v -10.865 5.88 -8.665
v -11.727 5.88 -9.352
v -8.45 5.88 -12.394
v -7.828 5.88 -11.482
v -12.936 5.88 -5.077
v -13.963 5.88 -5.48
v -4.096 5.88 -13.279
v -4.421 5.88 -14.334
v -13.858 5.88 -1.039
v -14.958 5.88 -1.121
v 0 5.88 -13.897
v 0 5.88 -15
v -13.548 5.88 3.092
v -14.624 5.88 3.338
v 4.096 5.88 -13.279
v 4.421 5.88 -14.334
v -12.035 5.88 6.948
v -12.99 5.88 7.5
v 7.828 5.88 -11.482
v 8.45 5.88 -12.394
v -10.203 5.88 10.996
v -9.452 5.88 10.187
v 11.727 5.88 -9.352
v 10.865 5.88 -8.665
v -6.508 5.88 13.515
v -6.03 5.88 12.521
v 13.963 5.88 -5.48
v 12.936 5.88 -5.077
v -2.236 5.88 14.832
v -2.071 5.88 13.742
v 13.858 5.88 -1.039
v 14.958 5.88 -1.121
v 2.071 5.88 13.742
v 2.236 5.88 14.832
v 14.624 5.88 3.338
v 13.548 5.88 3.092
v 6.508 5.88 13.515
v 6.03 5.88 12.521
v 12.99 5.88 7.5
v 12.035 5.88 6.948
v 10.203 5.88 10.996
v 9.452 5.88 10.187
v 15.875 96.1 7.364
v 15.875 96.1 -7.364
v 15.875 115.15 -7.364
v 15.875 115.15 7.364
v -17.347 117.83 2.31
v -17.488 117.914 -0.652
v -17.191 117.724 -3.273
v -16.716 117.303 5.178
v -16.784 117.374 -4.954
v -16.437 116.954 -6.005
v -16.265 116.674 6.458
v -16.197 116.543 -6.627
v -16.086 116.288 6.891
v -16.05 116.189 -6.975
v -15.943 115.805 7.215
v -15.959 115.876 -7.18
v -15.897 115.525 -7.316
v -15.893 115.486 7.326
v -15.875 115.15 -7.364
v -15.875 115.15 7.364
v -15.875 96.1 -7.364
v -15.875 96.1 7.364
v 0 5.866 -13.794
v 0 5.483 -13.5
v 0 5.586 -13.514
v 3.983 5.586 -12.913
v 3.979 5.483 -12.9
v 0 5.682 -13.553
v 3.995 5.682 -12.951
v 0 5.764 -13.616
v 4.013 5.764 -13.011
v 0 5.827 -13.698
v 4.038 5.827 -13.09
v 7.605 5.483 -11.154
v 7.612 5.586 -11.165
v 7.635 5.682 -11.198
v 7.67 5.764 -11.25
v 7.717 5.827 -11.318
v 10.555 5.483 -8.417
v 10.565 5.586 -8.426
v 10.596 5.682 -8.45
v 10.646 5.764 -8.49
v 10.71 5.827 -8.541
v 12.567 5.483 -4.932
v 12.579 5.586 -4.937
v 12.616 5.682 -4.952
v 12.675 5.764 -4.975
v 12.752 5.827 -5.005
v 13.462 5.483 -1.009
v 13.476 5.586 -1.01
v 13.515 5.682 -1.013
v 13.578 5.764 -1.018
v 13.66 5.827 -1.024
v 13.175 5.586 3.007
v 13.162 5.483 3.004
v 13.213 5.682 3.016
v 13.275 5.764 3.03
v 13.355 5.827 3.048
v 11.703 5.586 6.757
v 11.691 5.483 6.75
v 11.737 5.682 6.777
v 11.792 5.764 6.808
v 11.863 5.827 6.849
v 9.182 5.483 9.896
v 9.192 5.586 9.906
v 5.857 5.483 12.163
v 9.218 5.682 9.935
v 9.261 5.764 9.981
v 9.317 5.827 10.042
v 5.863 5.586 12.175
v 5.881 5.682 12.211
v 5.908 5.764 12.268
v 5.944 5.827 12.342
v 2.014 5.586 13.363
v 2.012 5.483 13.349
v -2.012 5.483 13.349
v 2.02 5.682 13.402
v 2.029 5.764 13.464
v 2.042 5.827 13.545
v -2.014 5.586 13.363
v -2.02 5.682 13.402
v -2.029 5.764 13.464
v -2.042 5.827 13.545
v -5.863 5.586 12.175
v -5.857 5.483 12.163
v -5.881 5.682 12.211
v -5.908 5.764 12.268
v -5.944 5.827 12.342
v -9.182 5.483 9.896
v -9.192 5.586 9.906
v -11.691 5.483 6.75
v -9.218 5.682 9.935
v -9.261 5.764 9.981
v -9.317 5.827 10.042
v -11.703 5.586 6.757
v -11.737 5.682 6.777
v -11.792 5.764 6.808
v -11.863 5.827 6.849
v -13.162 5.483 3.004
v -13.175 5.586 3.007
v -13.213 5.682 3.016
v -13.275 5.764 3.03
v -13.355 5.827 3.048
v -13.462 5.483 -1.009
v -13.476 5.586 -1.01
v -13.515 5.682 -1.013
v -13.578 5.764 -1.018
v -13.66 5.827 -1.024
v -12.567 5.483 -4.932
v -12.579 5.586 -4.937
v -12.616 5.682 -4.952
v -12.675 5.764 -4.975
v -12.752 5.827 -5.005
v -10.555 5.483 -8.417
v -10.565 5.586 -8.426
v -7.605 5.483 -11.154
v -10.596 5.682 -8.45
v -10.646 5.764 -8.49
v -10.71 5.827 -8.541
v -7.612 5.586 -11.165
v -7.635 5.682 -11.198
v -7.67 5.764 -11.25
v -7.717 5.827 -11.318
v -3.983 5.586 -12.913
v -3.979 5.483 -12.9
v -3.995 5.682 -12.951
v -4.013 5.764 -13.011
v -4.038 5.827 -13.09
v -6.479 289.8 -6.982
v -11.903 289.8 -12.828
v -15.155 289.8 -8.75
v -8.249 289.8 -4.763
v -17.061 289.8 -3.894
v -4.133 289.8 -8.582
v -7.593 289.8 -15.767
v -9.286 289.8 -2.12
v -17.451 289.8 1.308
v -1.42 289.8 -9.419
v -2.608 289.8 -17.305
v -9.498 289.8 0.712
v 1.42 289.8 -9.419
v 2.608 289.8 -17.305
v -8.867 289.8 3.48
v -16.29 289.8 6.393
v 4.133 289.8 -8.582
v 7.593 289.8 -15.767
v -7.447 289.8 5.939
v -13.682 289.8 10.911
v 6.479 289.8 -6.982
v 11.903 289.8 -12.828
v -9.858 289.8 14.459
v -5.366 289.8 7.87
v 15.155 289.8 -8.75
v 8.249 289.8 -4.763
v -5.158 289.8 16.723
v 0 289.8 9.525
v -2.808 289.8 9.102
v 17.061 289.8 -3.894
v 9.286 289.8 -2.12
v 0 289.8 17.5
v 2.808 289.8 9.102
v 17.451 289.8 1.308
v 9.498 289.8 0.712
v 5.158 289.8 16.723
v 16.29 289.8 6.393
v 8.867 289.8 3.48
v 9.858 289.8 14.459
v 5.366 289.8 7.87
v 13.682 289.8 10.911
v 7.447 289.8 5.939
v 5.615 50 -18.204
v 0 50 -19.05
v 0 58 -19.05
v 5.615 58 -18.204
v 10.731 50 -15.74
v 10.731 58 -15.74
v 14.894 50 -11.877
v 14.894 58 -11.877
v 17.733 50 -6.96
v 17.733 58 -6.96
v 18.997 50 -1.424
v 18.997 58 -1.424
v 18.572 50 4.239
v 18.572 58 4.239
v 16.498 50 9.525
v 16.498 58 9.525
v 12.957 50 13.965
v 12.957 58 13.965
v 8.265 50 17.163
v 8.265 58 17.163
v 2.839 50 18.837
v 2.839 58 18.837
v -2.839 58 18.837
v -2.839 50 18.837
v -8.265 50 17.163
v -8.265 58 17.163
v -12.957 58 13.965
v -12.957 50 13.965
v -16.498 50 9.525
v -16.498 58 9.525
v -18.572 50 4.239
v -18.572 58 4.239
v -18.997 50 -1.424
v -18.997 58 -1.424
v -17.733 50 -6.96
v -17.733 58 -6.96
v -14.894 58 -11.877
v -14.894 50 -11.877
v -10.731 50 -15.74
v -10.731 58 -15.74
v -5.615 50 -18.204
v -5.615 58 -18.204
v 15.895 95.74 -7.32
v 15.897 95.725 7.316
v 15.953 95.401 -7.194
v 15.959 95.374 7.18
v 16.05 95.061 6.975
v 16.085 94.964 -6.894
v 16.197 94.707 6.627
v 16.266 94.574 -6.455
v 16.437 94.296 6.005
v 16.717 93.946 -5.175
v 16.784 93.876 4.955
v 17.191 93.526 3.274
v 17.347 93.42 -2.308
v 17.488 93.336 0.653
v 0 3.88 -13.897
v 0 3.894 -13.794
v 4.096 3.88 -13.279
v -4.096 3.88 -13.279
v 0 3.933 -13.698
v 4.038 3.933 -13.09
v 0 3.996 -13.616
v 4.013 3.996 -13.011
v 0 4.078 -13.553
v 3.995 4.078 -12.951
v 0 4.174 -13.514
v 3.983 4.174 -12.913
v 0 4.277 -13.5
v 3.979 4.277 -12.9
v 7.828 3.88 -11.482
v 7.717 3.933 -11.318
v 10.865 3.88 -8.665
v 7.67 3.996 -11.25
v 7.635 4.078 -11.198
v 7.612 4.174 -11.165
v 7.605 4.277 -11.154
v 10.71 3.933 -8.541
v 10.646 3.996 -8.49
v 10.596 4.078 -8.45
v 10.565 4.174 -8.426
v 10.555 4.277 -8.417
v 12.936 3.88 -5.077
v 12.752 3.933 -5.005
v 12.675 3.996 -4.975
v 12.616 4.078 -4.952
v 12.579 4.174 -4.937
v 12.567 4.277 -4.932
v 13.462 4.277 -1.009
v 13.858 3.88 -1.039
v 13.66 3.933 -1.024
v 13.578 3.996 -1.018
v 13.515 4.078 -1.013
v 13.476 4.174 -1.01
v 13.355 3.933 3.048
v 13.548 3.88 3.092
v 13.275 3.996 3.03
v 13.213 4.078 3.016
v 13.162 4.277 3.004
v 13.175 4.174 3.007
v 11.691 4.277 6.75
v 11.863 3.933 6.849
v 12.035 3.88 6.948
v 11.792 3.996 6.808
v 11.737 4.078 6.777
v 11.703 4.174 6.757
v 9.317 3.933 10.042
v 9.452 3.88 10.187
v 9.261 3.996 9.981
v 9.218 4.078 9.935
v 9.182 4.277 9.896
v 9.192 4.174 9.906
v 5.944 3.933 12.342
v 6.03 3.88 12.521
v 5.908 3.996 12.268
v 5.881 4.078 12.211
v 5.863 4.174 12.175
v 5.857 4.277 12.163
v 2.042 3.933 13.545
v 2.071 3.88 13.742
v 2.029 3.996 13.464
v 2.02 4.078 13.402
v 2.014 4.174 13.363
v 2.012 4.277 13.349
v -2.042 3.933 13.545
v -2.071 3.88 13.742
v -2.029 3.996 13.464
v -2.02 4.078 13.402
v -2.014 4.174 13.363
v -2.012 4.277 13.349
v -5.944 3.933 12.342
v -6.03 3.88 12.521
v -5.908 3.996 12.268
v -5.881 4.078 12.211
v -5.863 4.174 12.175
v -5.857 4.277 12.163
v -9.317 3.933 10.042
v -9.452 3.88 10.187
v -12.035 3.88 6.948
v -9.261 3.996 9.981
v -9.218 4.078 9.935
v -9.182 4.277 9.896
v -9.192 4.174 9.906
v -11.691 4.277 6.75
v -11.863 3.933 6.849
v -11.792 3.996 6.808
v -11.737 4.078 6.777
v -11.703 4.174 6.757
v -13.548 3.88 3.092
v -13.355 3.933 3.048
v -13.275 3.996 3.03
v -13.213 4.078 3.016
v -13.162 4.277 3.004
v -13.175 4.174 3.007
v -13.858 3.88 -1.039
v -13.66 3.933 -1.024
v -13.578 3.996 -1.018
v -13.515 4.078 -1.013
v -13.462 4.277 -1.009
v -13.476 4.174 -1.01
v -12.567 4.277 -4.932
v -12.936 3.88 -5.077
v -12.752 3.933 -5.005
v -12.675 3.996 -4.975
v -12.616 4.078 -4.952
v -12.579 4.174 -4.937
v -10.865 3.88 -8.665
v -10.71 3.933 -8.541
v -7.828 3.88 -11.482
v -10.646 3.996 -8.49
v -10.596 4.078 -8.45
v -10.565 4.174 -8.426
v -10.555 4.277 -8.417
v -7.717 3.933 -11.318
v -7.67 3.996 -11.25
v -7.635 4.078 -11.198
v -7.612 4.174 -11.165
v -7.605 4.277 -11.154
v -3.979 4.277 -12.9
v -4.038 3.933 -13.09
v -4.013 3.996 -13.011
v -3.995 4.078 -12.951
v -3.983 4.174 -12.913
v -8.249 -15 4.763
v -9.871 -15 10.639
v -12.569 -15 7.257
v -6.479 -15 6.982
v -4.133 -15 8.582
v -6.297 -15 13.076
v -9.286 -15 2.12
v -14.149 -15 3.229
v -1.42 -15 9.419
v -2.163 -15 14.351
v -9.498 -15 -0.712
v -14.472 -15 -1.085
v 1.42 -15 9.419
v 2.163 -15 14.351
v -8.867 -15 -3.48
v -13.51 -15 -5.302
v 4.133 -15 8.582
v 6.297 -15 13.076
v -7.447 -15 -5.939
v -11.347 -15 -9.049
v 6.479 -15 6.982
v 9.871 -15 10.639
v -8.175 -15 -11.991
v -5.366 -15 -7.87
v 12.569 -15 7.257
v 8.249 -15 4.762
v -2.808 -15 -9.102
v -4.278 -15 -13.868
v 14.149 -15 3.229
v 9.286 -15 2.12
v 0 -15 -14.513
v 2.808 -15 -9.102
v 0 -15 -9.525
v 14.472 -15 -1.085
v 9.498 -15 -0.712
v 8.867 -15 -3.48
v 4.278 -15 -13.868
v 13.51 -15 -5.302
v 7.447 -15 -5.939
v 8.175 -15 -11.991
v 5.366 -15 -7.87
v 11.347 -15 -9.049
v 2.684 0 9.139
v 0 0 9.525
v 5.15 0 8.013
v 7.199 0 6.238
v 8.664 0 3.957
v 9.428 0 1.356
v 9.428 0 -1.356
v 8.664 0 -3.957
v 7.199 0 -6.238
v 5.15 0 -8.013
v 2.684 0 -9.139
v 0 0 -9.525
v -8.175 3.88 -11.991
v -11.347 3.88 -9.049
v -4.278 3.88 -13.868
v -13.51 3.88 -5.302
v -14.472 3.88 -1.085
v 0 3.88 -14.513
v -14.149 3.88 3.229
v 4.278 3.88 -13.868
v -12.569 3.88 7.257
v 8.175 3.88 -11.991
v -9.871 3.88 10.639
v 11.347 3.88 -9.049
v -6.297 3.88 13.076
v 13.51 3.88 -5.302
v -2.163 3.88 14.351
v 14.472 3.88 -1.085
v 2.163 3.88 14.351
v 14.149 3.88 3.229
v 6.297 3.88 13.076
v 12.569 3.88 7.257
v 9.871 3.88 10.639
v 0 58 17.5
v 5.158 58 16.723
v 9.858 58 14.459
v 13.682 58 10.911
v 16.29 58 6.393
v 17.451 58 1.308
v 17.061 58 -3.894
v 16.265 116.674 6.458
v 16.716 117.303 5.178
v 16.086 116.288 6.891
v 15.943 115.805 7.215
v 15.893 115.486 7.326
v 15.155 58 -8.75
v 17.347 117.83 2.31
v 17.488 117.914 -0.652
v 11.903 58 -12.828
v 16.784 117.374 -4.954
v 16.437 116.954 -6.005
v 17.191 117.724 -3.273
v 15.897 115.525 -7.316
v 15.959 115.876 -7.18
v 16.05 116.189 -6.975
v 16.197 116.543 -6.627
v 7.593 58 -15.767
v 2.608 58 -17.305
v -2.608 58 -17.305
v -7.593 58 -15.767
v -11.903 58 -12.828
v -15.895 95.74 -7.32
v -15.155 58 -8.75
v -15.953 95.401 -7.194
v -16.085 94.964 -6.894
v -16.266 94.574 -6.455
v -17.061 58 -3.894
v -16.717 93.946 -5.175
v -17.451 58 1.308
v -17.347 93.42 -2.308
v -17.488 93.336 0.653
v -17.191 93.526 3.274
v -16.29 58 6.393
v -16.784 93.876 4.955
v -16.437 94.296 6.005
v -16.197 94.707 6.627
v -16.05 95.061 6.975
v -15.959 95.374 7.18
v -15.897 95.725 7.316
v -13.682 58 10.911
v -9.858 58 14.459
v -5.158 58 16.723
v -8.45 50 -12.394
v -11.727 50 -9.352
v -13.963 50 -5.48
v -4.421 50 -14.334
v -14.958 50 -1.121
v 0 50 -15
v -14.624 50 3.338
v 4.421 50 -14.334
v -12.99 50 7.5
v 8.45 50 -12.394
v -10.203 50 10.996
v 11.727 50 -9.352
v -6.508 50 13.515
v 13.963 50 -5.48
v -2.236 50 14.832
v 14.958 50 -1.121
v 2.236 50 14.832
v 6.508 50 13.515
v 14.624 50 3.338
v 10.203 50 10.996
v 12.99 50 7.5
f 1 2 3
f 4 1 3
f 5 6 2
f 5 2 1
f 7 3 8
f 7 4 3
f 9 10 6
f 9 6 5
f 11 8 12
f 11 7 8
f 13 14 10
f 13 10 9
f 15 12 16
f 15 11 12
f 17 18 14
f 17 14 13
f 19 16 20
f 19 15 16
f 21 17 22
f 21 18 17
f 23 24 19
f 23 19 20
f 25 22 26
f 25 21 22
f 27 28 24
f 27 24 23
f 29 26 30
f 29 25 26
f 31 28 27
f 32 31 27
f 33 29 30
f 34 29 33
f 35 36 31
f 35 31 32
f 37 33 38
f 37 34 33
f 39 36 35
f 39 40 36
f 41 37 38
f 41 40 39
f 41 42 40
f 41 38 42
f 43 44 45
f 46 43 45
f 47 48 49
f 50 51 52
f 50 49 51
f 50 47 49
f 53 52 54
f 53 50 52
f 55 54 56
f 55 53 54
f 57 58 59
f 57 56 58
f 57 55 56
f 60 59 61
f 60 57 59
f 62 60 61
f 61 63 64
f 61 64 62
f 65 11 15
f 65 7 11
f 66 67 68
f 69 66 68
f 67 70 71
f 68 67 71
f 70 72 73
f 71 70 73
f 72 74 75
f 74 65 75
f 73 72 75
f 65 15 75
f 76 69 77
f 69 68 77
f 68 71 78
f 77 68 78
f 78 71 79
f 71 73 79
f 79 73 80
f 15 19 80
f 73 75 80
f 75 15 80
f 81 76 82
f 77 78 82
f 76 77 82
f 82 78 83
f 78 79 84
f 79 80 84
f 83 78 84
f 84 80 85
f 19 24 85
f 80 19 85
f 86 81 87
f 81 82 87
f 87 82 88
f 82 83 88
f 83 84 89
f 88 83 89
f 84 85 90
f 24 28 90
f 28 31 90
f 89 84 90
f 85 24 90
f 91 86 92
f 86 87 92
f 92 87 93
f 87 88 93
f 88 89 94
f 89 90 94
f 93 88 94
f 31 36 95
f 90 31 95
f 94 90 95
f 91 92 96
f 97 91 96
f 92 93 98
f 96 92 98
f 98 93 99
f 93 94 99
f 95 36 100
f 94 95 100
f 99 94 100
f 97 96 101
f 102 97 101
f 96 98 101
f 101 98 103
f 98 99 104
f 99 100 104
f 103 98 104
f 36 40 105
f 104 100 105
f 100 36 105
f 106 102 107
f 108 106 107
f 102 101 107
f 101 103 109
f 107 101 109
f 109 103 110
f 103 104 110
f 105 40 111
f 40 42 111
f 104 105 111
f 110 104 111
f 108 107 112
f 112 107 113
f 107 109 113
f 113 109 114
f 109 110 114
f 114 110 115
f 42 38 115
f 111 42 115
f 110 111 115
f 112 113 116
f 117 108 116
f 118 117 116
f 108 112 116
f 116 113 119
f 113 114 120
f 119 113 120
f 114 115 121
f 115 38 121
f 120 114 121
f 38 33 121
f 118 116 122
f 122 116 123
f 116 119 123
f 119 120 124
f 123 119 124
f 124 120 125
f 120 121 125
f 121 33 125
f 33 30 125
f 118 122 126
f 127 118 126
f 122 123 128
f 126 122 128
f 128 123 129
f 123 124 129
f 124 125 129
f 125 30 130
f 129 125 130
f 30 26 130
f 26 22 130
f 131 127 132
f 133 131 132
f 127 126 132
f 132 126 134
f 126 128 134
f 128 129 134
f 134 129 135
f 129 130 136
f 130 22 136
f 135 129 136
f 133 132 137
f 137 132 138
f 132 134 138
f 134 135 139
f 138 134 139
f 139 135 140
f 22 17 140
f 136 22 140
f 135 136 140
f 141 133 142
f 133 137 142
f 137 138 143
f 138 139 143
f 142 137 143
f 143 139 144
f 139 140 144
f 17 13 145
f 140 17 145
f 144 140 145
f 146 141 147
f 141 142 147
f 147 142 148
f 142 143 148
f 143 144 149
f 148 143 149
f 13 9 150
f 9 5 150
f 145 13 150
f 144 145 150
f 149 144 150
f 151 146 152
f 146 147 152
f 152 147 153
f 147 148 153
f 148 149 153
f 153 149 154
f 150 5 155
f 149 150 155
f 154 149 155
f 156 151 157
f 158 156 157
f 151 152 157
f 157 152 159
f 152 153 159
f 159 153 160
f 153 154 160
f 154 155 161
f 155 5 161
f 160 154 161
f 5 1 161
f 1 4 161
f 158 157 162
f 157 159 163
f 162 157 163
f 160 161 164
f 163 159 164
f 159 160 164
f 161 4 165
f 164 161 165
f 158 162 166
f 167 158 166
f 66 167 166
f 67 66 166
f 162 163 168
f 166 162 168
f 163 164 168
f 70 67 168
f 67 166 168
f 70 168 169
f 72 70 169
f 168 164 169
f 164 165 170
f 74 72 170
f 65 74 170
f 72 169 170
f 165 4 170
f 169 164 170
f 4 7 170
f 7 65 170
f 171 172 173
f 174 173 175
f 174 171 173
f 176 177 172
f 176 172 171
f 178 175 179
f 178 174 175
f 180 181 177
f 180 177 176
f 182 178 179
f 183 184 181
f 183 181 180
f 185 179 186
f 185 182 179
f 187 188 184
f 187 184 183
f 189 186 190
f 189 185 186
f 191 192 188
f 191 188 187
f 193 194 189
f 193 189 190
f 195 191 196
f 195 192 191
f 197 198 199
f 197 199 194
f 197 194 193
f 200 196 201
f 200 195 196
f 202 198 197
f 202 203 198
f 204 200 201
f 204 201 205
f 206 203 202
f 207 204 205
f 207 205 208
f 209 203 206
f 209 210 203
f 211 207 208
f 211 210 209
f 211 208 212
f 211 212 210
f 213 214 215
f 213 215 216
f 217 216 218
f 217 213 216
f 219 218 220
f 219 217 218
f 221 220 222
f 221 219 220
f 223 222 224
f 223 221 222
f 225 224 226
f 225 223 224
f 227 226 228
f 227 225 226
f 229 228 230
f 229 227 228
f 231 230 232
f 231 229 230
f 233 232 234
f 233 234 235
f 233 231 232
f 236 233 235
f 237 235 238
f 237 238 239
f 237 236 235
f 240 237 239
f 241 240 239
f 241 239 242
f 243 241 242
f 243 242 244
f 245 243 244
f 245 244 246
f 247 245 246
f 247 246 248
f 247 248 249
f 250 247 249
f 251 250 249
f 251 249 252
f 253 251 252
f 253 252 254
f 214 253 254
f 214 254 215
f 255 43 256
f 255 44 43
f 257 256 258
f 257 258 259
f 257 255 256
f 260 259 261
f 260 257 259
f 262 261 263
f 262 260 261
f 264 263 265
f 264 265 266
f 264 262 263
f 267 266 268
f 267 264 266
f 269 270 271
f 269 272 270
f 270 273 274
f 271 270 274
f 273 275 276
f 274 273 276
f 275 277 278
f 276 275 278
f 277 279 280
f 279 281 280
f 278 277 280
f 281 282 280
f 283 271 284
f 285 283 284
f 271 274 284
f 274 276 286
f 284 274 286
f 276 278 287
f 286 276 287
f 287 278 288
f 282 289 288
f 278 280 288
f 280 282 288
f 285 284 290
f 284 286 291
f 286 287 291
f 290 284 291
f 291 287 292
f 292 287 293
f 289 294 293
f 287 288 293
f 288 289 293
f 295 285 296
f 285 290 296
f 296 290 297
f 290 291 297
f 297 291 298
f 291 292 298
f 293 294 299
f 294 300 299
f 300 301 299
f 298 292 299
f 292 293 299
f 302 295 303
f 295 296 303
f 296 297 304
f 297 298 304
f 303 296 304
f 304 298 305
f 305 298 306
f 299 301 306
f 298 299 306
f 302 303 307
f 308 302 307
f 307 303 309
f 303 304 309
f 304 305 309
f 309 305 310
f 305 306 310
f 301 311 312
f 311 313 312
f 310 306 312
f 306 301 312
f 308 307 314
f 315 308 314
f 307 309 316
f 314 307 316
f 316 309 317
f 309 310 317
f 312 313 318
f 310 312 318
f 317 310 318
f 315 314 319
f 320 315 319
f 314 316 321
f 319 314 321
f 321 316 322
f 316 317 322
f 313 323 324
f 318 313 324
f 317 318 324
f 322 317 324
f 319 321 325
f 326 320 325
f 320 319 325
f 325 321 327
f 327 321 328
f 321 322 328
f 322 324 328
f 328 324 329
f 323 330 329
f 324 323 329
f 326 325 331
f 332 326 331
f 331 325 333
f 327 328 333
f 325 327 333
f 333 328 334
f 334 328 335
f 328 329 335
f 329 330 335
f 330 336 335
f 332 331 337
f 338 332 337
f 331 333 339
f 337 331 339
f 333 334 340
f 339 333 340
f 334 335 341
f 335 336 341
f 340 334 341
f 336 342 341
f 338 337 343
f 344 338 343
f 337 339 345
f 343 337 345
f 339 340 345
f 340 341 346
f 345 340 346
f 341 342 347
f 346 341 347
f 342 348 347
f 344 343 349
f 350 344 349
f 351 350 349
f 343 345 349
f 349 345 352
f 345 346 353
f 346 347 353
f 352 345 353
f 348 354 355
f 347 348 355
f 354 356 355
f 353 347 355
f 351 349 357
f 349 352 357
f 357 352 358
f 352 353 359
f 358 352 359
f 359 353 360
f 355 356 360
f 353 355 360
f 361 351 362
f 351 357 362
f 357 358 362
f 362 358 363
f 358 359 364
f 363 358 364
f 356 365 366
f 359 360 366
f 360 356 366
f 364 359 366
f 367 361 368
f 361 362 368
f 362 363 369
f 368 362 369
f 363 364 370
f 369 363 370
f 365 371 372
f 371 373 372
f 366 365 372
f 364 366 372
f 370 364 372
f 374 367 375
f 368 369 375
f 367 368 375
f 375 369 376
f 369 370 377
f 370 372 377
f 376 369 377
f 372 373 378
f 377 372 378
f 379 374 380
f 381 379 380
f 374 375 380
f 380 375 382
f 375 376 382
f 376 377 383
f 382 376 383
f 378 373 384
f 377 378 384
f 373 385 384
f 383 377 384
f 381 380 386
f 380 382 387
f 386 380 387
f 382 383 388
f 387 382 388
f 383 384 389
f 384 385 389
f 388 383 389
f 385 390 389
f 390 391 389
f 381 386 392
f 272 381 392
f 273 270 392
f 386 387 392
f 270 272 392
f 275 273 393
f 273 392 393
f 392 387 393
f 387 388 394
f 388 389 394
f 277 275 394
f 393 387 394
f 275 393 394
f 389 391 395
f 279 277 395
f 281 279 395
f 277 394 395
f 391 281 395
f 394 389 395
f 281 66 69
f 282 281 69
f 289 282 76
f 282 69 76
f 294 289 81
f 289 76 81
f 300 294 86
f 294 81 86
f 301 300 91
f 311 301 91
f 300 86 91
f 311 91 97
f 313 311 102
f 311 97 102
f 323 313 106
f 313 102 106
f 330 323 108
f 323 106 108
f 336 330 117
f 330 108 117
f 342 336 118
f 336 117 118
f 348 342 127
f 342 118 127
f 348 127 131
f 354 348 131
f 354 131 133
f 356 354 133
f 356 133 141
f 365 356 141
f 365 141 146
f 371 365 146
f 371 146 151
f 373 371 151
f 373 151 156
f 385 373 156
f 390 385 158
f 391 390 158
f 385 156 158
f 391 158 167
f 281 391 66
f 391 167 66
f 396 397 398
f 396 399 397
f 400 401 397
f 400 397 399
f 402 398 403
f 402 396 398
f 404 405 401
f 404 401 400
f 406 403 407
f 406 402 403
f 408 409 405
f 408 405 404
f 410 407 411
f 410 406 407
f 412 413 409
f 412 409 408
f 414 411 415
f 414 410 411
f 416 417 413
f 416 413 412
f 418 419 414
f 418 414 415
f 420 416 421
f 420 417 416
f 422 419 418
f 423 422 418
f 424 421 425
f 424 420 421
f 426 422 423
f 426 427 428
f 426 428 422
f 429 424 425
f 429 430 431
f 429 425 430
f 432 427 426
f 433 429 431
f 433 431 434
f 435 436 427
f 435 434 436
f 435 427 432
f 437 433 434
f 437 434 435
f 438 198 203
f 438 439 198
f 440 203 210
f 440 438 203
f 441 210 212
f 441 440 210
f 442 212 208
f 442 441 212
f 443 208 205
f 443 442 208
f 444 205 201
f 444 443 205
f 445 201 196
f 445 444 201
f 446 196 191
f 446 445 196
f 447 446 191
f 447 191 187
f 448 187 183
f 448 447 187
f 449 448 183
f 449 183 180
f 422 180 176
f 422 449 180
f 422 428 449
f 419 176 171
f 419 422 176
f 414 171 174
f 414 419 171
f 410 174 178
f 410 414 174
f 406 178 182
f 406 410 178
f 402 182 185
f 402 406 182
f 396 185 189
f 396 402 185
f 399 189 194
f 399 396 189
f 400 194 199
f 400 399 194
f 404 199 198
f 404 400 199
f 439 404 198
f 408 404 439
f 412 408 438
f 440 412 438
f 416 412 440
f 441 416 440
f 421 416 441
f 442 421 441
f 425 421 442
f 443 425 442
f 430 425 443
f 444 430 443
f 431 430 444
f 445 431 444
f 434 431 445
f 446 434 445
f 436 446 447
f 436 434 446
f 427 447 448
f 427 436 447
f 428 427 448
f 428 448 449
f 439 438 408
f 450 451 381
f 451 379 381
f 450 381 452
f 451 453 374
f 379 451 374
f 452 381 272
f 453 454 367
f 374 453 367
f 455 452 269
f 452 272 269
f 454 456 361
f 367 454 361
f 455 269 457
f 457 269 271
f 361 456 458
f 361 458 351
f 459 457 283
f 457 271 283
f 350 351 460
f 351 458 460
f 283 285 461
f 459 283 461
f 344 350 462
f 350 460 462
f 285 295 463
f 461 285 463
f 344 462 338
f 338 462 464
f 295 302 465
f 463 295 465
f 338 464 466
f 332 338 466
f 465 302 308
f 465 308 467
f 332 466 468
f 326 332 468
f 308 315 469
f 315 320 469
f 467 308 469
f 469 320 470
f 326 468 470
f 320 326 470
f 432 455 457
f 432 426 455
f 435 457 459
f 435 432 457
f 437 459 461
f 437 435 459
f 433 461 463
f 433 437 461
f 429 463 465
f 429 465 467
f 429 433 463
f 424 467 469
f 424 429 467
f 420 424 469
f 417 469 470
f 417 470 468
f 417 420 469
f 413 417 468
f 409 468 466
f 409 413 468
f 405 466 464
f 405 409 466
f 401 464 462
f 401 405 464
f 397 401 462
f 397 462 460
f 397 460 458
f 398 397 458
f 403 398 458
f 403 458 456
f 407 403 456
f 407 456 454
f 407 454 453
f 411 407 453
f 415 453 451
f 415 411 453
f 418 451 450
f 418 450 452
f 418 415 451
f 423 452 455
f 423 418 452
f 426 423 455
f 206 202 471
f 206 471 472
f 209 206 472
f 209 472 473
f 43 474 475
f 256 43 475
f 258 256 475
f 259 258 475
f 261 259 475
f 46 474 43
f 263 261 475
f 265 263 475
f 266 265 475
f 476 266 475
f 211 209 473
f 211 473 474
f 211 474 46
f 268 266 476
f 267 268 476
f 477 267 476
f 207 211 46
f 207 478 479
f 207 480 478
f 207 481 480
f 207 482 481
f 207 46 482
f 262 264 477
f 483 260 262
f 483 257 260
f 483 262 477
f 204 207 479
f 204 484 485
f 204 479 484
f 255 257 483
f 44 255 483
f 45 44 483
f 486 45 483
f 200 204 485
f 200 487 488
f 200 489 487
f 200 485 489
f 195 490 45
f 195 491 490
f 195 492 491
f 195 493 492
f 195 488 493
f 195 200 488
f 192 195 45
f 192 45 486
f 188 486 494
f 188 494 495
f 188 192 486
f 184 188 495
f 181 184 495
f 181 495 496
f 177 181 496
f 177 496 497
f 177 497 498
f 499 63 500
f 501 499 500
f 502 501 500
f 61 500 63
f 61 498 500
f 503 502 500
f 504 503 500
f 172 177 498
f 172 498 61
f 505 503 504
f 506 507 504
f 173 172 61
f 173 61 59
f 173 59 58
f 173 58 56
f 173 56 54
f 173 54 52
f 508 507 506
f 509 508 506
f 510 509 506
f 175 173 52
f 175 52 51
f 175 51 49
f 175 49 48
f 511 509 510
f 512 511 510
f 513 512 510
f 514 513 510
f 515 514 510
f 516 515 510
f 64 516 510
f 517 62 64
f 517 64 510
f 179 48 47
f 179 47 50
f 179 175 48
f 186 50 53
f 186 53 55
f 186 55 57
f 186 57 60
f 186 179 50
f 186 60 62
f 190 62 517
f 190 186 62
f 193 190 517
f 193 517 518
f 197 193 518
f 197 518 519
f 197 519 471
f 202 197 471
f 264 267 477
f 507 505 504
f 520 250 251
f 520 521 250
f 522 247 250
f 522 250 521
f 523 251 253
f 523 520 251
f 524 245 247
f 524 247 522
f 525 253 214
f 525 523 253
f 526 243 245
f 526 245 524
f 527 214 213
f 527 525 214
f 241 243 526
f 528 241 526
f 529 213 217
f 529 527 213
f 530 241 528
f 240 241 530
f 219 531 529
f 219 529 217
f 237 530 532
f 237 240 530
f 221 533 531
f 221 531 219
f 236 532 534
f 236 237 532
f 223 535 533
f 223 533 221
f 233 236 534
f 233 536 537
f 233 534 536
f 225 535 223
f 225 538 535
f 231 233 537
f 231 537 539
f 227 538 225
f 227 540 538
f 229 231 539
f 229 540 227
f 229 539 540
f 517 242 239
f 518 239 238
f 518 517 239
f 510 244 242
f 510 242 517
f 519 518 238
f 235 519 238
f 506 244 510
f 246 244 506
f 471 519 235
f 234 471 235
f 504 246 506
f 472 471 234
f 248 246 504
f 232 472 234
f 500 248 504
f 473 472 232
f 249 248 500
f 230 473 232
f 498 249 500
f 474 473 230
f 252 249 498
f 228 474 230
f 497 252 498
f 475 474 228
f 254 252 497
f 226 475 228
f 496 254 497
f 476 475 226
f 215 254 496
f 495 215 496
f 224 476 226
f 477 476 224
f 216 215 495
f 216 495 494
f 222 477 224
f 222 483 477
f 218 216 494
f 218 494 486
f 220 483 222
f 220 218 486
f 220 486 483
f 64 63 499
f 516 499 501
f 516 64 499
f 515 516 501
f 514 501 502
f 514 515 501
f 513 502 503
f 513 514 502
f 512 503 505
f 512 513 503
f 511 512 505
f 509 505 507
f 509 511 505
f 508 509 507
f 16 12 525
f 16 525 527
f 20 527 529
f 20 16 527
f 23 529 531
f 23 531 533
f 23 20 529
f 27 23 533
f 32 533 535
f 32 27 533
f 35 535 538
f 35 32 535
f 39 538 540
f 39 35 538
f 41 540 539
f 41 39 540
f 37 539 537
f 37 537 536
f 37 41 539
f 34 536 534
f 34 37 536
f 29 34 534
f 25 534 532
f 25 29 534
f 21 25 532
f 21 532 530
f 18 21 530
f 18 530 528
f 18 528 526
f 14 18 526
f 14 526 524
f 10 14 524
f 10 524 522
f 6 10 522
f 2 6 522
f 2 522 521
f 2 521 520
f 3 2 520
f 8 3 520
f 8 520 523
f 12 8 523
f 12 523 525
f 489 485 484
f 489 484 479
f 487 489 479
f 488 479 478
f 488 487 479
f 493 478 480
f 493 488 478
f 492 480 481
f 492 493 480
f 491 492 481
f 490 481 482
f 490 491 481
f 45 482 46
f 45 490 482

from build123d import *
from build123d.topology import SkipClean

# Parameters (mm, degrees)
SKETCH1_R               = 22.5
SKETCH1_R_2             = 9.525
BOSS_EXTRUDE1_DEPTH     = 95
SKETCH2_OUTSIDE_W       = 69.87
SKETCH2_OUTSIDE_H       = 69.87
SKETCH2_OUTSIDE_R       = 15
CUT_EXTRUDE1_DEPTH      = 50
SKETCH4_OUTSIDE_W       = 69.87
SKETCH4_OUTSIDE_H       = 69.87
SKETCH4_OUTSIDE_R       = 17.5
CUT_EXTRUDE2_DEPTH      = 37
SKETCH11_OUTSIDE_W      = 69.87
SKETCH11_OUTSIDE_H      = 69.87
SKETCH11_OUTSIDE_R      = 14.513
CUT_EXTRUDE3_DEPTH      = 5.88
SKETCH12_R              = 17.5
SKETCH12_R_2            = 9.525
BOSS_EXTRUDE2_DEPTH     = 203.2
BOSS_EXTRUDE3_START     = 15
SKETCH13_R              = 14.513
SKETCH13_R_2            = 9.525
BOSS_EXTRUDE3_DEPTH     = 15
SKETCH15_OUTSIDE_W      = 110.92
SKETCH15_OUTSIDE_H      = 110.92
SKETCH15_OUTSIDE_R      = 19.05
CUT_EXTRUDE5_DEPTH      = 251.231372933
SKETCH16_OUTSIDE_W      = 103.66
SKETCH16_OUTSIDE_H      = 103.66
SKETCH16_OUTSIDE_R      = 13.5
CUT_EXTRUDE6_DEPTH      = 2
FILLET2_R               = 0.396875
SKETCH17_R              = 17.5
CUT_EXTRUDE7_DEPTH      = 8.4
CUT_EXTRUDE8_DEPTH      = 292.049557636
CUT_EXTRUDE8_DEPTH_BACK = 292.049557636
SKETCH20_W              = 3.175
SKETCH20_H              = 25.4
FILLET3_R               = 3.175


with BuildPart() as part:
    # Sketch1 → Boss-Extrude1 (new body)
    with BuildSketch(Plane(origin=(0, 0, 0), x_dir=(1, 0, 0), z_dir=(0, 1, 0))):
        with Locations(Location((0, 0, 0), (0, 0, 270))):
            Circle(SKETCH1_R)
        with Locations(Location((0, 0, 0), (0, 0, 270))):
            Circle(SKETCH1_R_2, mode=Mode.SUBTRACT)
    extrude(amount=BOSS_EXTRUDE1_DEPTH)

    # Sketch2 outside → Cut-Extrude1 (cut)
    with BuildSketch(Plane.XZ):
        Rectangle(SKETCH2_OUTSIDE_W, SKETCH2_OUTSIDE_H)
        with Locations(Location((0, 0, 0), (0, 0, 270))):
            Circle(SKETCH2_OUTSIDE_R, mode=Mode.SUBTRACT)
    extrude(amount=-CUT_EXTRUDE1_DEPTH, mode=Mode.SUBTRACT)

    # Sketch4 outside → Cut-Extrude2 (cut)
    with BuildSketch(Plane(origin=(0, 95, 0), x_dir=(1, 0, 0), z_dir=(0, 1, 0))):
        Rectangle(SKETCH4_OUTSIDE_W, SKETCH4_OUTSIDE_H)
        with Locations(Location((0, 0, 0), (0, 0, 270))):
            Circle(SKETCH4_OUTSIDE_R, mode=Mode.SUBTRACT)
    extrude(amount=-CUT_EXTRUDE2_DEPTH, mode=Mode.SUBTRACT)

    # Sketch11 outside → Cut-Extrude3 (cut)
    with BuildSketch(Plane.XZ):
        Rectangle(SKETCH11_OUTSIDE_W, SKETCH11_OUTSIDE_H)
        with Locations(Location((0, 0, 0), (0, 0, 270))):
            Circle(SKETCH11_OUTSIDE_R, mode=Mode.SUBTRACT)
    extrude(amount=-CUT_EXTRUDE3_DEPTH, mode=Mode.SUBTRACT)

    # Sketch12 → Boss-Extrude2 (add)
    with BuildSketch(Plane(origin=(0, 95, 0), x_dir=(1, 0, 0), z_dir=(0, 1, 0))):
        with Locations(Location((0, 0, 0), (0, 0, 270))):
            Circle(SKETCH12_R)
        with Locations(Location((0, 0, 0), (0, 0, 270))):
            Circle(SKETCH12_R_2, mode=Mode.SUBTRACT)
    extrude(amount=BOSS_EXTRUDE2_DEPTH)

    # Sketch13 → Boss-Extrude3 (add)
    with SkipClean():  # the faces are left unmerged after this step: merging them gives an invalid solid
        with BuildSketch(Plane.XZ.offset(BOSS_EXTRUDE3_START)):
            with Locations(Location((0, 0, 0), (0, 0, 270))):
                Circle(SKETCH13_R)
            with Locations(Location((0, 0, 0), (0, 0, 270))):
                Circle(SKETCH13_R_2, mode=Mode.SUBTRACT)
        extrude(amount=-BOSS_EXTRUDE3_DEPTH)

    # Sketch15 outside → Cut-Extrude5 (cut, through all)
    with SkipClean():  # the faces are left unmerged after this step: merging them gives an invalid solid
        with BuildSketch(Plane.XZ.offset(-50)):
            Rectangle(SKETCH15_OUTSIDE_W, SKETCH15_OUTSIDE_H)
            with Locations(Location((0, 0, 0), (0, 0, 270))):
                Circle(SKETCH15_OUTSIDE_R, mode=Mode.SUBTRACT)
        extrude(amount=-CUT_EXTRUDE5_DEPTH, mode=Mode.SUBTRACT)

    # Sketch16 outside → Cut-Extrude6 (cut)
    with SkipClean():  # the faces are left unmerged after this step: merging them gives an invalid solid
        with BuildSketch(Plane.XZ.offset(-5.88)):
            Rectangle(SKETCH16_OUTSIDE_W, SKETCH16_OUTSIDE_H)
            with Locations(Location((0, 0, 0), (0, 0, 270))):
                Circle(SKETCH16_OUTSIDE_R, mode=Mode.SUBTRACT)
        extrude(amount=CUT_EXTRUDE6_DEPTH, mode=Mode.SUBTRACT)

    # Fillet2
    fillet2_edges = [part.edges().sort_by_distance(p)[0] for p in [
        (0, 5.88, 13.5),
        (0, 3.88, 13.5),
    ]]
    fillet(fillet2_edges, radius=FILLET2_R)

    # Sketch17 → Cut-Extrude7 (cut)
    with BuildSketch(Plane(origin=(0, 298.2, 0), x_dir=(1, 0, 0), z_dir=(0, 1, 0))):
        with Locations(Location((0, 0, 0), (0, 0, 270))):
            Circle(SKETCH17_R)
    extrude(amount=-CUT_EXTRUDE7_DEPTH, mode=Mode.SUBTRACT)

    # Sketch20 → Cut-Extrude8 (cut, two sides: drawn at the far end of the back side and taken through both)
    with BuildSketch(Plane.XY.offset(-CUT_EXTRUDE8_DEPTH_BACK)):
        with Locations((-17.4625, 105.625)):
            Rectangle(SKETCH20_W, SKETCH20_H)
        with Locations((17.4625, 105.625)):
            Rectangle(SKETCH20_W, SKETCH20_H)
    extrude(amount=CUT_EXTRUDE8_DEPTH + CUT_EXTRUDE8_DEPTH_BACK, mode=Mode.SUBTRACT)

    # Fillet3
    # the kernel refuses this fillet: 3.175 mm, written as the material it adds along each edge
    with BuildSketch(Plane(origin=(-15.875, 92.925, 15.301899161), x_dir=(0, 1, 0), z_dir=(0, 0, -1))) as fillet3_piece_1_section:
        with BuildLine():
            CenterArc((FILLET3_R, -FILLET3_R), FILLET3_R, 90, 90)
            Line((0, -FILLET3_R), (0, 0))
            Line((0, 0), (FILLET3_R, 0))
        make_face()
    fillet3_piece_1 = extrude(amount=30.603798322, mode=Mode.PRIVATE)
    fillet3_piece_1 = fillet3_piece_1 & Plane(origin=(0, 93.819377515, 0), x_dir=(0, 0, 1), z_dir=(0, 1, 0)) * Cylinder(17.5, 74, mode=Mode.PRIVATE)
    add(fillet3_piece_1)
    with BuildSketch(Plane(origin=(-15.875, 118.325, 15.301899161), x_dir=(0, -1, 0), z_dir=(0, 0, -1))) as fillet3_piece_2_section:
        with BuildLine():
            CenterArc((FILLET3_R, FILLET3_R), FILLET3_R, 180, 90)
            Line((0, FILLET3_R), (0, 0))
            Line((0, 0), (FILLET3_R, 0))
        make_face()
    fillet3_piece_2 = extrude(amount=30.603798322, mode=Mode.PRIVATE)
    fillet3_piece_2 = fillet3_piece_2 & Plane(origin=(0, 117.430622485, 0), x_dir=(0, 0, 1), z_dir=(0, 1, 0)) * Cylinder(17.5, 74, mode=Mode.PRIVATE)
    add(fillet3_piece_2)
    with BuildSketch(Plane(origin=(15.875, 92.925, -15.301899161), x_dir=(0, 1, 0), z_dir=(0, 0, 1))) as fillet3_piece_3_section:
        with BuildLine():
            CenterArc((FILLET3_R, -FILLET3_R), FILLET3_R, 90, 90)
            Line((0, -FILLET3_R), (0, 0))
            Line((0, 0), (FILLET3_R, 0))
        make_face()
    fillet3_piece_3 = extrude(amount=30.603798322, mode=Mode.PRIVATE)
    fillet3_piece_3 = fillet3_piece_3 & Plane(origin=(0, 93.81935464, 0), x_dir=(0, 0, 1), z_dir=(0, 1, 0)) * Cylinder(17.5, 74, mode=Mode.PRIVATE)
    add(fillet3_piece_3)
    with BuildSketch(Plane(origin=(15.875, 118.325, -15.301899161), x_dir=(0, -1, 0), z_dir=(0, 0, 1))) as fillet3_piece_4_section:
        with BuildLine():
            CenterArc((FILLET3_R, FILLET3_R), FILLET3_R, 180, 90)
            Line((0, FILLET3_R), (0, 0))
            Line((0, 0), (FILLET3_R, 0))
        make_face()
    fillet3_piece_4 = extrude(amount=30.603798322, mode=Mode.PRIVATE)
    fillet3_piece_4 = fillet3_piece_4 & Plane(origin=(0, 117.43064536, 0), x_dir=(0, 0, 1), z_dir=(0, 1, 0)) * Cylinder(17.5, 74, mode=Mode.PRIVATE)
    add(fillet3_piece_4)


solid = part.part
